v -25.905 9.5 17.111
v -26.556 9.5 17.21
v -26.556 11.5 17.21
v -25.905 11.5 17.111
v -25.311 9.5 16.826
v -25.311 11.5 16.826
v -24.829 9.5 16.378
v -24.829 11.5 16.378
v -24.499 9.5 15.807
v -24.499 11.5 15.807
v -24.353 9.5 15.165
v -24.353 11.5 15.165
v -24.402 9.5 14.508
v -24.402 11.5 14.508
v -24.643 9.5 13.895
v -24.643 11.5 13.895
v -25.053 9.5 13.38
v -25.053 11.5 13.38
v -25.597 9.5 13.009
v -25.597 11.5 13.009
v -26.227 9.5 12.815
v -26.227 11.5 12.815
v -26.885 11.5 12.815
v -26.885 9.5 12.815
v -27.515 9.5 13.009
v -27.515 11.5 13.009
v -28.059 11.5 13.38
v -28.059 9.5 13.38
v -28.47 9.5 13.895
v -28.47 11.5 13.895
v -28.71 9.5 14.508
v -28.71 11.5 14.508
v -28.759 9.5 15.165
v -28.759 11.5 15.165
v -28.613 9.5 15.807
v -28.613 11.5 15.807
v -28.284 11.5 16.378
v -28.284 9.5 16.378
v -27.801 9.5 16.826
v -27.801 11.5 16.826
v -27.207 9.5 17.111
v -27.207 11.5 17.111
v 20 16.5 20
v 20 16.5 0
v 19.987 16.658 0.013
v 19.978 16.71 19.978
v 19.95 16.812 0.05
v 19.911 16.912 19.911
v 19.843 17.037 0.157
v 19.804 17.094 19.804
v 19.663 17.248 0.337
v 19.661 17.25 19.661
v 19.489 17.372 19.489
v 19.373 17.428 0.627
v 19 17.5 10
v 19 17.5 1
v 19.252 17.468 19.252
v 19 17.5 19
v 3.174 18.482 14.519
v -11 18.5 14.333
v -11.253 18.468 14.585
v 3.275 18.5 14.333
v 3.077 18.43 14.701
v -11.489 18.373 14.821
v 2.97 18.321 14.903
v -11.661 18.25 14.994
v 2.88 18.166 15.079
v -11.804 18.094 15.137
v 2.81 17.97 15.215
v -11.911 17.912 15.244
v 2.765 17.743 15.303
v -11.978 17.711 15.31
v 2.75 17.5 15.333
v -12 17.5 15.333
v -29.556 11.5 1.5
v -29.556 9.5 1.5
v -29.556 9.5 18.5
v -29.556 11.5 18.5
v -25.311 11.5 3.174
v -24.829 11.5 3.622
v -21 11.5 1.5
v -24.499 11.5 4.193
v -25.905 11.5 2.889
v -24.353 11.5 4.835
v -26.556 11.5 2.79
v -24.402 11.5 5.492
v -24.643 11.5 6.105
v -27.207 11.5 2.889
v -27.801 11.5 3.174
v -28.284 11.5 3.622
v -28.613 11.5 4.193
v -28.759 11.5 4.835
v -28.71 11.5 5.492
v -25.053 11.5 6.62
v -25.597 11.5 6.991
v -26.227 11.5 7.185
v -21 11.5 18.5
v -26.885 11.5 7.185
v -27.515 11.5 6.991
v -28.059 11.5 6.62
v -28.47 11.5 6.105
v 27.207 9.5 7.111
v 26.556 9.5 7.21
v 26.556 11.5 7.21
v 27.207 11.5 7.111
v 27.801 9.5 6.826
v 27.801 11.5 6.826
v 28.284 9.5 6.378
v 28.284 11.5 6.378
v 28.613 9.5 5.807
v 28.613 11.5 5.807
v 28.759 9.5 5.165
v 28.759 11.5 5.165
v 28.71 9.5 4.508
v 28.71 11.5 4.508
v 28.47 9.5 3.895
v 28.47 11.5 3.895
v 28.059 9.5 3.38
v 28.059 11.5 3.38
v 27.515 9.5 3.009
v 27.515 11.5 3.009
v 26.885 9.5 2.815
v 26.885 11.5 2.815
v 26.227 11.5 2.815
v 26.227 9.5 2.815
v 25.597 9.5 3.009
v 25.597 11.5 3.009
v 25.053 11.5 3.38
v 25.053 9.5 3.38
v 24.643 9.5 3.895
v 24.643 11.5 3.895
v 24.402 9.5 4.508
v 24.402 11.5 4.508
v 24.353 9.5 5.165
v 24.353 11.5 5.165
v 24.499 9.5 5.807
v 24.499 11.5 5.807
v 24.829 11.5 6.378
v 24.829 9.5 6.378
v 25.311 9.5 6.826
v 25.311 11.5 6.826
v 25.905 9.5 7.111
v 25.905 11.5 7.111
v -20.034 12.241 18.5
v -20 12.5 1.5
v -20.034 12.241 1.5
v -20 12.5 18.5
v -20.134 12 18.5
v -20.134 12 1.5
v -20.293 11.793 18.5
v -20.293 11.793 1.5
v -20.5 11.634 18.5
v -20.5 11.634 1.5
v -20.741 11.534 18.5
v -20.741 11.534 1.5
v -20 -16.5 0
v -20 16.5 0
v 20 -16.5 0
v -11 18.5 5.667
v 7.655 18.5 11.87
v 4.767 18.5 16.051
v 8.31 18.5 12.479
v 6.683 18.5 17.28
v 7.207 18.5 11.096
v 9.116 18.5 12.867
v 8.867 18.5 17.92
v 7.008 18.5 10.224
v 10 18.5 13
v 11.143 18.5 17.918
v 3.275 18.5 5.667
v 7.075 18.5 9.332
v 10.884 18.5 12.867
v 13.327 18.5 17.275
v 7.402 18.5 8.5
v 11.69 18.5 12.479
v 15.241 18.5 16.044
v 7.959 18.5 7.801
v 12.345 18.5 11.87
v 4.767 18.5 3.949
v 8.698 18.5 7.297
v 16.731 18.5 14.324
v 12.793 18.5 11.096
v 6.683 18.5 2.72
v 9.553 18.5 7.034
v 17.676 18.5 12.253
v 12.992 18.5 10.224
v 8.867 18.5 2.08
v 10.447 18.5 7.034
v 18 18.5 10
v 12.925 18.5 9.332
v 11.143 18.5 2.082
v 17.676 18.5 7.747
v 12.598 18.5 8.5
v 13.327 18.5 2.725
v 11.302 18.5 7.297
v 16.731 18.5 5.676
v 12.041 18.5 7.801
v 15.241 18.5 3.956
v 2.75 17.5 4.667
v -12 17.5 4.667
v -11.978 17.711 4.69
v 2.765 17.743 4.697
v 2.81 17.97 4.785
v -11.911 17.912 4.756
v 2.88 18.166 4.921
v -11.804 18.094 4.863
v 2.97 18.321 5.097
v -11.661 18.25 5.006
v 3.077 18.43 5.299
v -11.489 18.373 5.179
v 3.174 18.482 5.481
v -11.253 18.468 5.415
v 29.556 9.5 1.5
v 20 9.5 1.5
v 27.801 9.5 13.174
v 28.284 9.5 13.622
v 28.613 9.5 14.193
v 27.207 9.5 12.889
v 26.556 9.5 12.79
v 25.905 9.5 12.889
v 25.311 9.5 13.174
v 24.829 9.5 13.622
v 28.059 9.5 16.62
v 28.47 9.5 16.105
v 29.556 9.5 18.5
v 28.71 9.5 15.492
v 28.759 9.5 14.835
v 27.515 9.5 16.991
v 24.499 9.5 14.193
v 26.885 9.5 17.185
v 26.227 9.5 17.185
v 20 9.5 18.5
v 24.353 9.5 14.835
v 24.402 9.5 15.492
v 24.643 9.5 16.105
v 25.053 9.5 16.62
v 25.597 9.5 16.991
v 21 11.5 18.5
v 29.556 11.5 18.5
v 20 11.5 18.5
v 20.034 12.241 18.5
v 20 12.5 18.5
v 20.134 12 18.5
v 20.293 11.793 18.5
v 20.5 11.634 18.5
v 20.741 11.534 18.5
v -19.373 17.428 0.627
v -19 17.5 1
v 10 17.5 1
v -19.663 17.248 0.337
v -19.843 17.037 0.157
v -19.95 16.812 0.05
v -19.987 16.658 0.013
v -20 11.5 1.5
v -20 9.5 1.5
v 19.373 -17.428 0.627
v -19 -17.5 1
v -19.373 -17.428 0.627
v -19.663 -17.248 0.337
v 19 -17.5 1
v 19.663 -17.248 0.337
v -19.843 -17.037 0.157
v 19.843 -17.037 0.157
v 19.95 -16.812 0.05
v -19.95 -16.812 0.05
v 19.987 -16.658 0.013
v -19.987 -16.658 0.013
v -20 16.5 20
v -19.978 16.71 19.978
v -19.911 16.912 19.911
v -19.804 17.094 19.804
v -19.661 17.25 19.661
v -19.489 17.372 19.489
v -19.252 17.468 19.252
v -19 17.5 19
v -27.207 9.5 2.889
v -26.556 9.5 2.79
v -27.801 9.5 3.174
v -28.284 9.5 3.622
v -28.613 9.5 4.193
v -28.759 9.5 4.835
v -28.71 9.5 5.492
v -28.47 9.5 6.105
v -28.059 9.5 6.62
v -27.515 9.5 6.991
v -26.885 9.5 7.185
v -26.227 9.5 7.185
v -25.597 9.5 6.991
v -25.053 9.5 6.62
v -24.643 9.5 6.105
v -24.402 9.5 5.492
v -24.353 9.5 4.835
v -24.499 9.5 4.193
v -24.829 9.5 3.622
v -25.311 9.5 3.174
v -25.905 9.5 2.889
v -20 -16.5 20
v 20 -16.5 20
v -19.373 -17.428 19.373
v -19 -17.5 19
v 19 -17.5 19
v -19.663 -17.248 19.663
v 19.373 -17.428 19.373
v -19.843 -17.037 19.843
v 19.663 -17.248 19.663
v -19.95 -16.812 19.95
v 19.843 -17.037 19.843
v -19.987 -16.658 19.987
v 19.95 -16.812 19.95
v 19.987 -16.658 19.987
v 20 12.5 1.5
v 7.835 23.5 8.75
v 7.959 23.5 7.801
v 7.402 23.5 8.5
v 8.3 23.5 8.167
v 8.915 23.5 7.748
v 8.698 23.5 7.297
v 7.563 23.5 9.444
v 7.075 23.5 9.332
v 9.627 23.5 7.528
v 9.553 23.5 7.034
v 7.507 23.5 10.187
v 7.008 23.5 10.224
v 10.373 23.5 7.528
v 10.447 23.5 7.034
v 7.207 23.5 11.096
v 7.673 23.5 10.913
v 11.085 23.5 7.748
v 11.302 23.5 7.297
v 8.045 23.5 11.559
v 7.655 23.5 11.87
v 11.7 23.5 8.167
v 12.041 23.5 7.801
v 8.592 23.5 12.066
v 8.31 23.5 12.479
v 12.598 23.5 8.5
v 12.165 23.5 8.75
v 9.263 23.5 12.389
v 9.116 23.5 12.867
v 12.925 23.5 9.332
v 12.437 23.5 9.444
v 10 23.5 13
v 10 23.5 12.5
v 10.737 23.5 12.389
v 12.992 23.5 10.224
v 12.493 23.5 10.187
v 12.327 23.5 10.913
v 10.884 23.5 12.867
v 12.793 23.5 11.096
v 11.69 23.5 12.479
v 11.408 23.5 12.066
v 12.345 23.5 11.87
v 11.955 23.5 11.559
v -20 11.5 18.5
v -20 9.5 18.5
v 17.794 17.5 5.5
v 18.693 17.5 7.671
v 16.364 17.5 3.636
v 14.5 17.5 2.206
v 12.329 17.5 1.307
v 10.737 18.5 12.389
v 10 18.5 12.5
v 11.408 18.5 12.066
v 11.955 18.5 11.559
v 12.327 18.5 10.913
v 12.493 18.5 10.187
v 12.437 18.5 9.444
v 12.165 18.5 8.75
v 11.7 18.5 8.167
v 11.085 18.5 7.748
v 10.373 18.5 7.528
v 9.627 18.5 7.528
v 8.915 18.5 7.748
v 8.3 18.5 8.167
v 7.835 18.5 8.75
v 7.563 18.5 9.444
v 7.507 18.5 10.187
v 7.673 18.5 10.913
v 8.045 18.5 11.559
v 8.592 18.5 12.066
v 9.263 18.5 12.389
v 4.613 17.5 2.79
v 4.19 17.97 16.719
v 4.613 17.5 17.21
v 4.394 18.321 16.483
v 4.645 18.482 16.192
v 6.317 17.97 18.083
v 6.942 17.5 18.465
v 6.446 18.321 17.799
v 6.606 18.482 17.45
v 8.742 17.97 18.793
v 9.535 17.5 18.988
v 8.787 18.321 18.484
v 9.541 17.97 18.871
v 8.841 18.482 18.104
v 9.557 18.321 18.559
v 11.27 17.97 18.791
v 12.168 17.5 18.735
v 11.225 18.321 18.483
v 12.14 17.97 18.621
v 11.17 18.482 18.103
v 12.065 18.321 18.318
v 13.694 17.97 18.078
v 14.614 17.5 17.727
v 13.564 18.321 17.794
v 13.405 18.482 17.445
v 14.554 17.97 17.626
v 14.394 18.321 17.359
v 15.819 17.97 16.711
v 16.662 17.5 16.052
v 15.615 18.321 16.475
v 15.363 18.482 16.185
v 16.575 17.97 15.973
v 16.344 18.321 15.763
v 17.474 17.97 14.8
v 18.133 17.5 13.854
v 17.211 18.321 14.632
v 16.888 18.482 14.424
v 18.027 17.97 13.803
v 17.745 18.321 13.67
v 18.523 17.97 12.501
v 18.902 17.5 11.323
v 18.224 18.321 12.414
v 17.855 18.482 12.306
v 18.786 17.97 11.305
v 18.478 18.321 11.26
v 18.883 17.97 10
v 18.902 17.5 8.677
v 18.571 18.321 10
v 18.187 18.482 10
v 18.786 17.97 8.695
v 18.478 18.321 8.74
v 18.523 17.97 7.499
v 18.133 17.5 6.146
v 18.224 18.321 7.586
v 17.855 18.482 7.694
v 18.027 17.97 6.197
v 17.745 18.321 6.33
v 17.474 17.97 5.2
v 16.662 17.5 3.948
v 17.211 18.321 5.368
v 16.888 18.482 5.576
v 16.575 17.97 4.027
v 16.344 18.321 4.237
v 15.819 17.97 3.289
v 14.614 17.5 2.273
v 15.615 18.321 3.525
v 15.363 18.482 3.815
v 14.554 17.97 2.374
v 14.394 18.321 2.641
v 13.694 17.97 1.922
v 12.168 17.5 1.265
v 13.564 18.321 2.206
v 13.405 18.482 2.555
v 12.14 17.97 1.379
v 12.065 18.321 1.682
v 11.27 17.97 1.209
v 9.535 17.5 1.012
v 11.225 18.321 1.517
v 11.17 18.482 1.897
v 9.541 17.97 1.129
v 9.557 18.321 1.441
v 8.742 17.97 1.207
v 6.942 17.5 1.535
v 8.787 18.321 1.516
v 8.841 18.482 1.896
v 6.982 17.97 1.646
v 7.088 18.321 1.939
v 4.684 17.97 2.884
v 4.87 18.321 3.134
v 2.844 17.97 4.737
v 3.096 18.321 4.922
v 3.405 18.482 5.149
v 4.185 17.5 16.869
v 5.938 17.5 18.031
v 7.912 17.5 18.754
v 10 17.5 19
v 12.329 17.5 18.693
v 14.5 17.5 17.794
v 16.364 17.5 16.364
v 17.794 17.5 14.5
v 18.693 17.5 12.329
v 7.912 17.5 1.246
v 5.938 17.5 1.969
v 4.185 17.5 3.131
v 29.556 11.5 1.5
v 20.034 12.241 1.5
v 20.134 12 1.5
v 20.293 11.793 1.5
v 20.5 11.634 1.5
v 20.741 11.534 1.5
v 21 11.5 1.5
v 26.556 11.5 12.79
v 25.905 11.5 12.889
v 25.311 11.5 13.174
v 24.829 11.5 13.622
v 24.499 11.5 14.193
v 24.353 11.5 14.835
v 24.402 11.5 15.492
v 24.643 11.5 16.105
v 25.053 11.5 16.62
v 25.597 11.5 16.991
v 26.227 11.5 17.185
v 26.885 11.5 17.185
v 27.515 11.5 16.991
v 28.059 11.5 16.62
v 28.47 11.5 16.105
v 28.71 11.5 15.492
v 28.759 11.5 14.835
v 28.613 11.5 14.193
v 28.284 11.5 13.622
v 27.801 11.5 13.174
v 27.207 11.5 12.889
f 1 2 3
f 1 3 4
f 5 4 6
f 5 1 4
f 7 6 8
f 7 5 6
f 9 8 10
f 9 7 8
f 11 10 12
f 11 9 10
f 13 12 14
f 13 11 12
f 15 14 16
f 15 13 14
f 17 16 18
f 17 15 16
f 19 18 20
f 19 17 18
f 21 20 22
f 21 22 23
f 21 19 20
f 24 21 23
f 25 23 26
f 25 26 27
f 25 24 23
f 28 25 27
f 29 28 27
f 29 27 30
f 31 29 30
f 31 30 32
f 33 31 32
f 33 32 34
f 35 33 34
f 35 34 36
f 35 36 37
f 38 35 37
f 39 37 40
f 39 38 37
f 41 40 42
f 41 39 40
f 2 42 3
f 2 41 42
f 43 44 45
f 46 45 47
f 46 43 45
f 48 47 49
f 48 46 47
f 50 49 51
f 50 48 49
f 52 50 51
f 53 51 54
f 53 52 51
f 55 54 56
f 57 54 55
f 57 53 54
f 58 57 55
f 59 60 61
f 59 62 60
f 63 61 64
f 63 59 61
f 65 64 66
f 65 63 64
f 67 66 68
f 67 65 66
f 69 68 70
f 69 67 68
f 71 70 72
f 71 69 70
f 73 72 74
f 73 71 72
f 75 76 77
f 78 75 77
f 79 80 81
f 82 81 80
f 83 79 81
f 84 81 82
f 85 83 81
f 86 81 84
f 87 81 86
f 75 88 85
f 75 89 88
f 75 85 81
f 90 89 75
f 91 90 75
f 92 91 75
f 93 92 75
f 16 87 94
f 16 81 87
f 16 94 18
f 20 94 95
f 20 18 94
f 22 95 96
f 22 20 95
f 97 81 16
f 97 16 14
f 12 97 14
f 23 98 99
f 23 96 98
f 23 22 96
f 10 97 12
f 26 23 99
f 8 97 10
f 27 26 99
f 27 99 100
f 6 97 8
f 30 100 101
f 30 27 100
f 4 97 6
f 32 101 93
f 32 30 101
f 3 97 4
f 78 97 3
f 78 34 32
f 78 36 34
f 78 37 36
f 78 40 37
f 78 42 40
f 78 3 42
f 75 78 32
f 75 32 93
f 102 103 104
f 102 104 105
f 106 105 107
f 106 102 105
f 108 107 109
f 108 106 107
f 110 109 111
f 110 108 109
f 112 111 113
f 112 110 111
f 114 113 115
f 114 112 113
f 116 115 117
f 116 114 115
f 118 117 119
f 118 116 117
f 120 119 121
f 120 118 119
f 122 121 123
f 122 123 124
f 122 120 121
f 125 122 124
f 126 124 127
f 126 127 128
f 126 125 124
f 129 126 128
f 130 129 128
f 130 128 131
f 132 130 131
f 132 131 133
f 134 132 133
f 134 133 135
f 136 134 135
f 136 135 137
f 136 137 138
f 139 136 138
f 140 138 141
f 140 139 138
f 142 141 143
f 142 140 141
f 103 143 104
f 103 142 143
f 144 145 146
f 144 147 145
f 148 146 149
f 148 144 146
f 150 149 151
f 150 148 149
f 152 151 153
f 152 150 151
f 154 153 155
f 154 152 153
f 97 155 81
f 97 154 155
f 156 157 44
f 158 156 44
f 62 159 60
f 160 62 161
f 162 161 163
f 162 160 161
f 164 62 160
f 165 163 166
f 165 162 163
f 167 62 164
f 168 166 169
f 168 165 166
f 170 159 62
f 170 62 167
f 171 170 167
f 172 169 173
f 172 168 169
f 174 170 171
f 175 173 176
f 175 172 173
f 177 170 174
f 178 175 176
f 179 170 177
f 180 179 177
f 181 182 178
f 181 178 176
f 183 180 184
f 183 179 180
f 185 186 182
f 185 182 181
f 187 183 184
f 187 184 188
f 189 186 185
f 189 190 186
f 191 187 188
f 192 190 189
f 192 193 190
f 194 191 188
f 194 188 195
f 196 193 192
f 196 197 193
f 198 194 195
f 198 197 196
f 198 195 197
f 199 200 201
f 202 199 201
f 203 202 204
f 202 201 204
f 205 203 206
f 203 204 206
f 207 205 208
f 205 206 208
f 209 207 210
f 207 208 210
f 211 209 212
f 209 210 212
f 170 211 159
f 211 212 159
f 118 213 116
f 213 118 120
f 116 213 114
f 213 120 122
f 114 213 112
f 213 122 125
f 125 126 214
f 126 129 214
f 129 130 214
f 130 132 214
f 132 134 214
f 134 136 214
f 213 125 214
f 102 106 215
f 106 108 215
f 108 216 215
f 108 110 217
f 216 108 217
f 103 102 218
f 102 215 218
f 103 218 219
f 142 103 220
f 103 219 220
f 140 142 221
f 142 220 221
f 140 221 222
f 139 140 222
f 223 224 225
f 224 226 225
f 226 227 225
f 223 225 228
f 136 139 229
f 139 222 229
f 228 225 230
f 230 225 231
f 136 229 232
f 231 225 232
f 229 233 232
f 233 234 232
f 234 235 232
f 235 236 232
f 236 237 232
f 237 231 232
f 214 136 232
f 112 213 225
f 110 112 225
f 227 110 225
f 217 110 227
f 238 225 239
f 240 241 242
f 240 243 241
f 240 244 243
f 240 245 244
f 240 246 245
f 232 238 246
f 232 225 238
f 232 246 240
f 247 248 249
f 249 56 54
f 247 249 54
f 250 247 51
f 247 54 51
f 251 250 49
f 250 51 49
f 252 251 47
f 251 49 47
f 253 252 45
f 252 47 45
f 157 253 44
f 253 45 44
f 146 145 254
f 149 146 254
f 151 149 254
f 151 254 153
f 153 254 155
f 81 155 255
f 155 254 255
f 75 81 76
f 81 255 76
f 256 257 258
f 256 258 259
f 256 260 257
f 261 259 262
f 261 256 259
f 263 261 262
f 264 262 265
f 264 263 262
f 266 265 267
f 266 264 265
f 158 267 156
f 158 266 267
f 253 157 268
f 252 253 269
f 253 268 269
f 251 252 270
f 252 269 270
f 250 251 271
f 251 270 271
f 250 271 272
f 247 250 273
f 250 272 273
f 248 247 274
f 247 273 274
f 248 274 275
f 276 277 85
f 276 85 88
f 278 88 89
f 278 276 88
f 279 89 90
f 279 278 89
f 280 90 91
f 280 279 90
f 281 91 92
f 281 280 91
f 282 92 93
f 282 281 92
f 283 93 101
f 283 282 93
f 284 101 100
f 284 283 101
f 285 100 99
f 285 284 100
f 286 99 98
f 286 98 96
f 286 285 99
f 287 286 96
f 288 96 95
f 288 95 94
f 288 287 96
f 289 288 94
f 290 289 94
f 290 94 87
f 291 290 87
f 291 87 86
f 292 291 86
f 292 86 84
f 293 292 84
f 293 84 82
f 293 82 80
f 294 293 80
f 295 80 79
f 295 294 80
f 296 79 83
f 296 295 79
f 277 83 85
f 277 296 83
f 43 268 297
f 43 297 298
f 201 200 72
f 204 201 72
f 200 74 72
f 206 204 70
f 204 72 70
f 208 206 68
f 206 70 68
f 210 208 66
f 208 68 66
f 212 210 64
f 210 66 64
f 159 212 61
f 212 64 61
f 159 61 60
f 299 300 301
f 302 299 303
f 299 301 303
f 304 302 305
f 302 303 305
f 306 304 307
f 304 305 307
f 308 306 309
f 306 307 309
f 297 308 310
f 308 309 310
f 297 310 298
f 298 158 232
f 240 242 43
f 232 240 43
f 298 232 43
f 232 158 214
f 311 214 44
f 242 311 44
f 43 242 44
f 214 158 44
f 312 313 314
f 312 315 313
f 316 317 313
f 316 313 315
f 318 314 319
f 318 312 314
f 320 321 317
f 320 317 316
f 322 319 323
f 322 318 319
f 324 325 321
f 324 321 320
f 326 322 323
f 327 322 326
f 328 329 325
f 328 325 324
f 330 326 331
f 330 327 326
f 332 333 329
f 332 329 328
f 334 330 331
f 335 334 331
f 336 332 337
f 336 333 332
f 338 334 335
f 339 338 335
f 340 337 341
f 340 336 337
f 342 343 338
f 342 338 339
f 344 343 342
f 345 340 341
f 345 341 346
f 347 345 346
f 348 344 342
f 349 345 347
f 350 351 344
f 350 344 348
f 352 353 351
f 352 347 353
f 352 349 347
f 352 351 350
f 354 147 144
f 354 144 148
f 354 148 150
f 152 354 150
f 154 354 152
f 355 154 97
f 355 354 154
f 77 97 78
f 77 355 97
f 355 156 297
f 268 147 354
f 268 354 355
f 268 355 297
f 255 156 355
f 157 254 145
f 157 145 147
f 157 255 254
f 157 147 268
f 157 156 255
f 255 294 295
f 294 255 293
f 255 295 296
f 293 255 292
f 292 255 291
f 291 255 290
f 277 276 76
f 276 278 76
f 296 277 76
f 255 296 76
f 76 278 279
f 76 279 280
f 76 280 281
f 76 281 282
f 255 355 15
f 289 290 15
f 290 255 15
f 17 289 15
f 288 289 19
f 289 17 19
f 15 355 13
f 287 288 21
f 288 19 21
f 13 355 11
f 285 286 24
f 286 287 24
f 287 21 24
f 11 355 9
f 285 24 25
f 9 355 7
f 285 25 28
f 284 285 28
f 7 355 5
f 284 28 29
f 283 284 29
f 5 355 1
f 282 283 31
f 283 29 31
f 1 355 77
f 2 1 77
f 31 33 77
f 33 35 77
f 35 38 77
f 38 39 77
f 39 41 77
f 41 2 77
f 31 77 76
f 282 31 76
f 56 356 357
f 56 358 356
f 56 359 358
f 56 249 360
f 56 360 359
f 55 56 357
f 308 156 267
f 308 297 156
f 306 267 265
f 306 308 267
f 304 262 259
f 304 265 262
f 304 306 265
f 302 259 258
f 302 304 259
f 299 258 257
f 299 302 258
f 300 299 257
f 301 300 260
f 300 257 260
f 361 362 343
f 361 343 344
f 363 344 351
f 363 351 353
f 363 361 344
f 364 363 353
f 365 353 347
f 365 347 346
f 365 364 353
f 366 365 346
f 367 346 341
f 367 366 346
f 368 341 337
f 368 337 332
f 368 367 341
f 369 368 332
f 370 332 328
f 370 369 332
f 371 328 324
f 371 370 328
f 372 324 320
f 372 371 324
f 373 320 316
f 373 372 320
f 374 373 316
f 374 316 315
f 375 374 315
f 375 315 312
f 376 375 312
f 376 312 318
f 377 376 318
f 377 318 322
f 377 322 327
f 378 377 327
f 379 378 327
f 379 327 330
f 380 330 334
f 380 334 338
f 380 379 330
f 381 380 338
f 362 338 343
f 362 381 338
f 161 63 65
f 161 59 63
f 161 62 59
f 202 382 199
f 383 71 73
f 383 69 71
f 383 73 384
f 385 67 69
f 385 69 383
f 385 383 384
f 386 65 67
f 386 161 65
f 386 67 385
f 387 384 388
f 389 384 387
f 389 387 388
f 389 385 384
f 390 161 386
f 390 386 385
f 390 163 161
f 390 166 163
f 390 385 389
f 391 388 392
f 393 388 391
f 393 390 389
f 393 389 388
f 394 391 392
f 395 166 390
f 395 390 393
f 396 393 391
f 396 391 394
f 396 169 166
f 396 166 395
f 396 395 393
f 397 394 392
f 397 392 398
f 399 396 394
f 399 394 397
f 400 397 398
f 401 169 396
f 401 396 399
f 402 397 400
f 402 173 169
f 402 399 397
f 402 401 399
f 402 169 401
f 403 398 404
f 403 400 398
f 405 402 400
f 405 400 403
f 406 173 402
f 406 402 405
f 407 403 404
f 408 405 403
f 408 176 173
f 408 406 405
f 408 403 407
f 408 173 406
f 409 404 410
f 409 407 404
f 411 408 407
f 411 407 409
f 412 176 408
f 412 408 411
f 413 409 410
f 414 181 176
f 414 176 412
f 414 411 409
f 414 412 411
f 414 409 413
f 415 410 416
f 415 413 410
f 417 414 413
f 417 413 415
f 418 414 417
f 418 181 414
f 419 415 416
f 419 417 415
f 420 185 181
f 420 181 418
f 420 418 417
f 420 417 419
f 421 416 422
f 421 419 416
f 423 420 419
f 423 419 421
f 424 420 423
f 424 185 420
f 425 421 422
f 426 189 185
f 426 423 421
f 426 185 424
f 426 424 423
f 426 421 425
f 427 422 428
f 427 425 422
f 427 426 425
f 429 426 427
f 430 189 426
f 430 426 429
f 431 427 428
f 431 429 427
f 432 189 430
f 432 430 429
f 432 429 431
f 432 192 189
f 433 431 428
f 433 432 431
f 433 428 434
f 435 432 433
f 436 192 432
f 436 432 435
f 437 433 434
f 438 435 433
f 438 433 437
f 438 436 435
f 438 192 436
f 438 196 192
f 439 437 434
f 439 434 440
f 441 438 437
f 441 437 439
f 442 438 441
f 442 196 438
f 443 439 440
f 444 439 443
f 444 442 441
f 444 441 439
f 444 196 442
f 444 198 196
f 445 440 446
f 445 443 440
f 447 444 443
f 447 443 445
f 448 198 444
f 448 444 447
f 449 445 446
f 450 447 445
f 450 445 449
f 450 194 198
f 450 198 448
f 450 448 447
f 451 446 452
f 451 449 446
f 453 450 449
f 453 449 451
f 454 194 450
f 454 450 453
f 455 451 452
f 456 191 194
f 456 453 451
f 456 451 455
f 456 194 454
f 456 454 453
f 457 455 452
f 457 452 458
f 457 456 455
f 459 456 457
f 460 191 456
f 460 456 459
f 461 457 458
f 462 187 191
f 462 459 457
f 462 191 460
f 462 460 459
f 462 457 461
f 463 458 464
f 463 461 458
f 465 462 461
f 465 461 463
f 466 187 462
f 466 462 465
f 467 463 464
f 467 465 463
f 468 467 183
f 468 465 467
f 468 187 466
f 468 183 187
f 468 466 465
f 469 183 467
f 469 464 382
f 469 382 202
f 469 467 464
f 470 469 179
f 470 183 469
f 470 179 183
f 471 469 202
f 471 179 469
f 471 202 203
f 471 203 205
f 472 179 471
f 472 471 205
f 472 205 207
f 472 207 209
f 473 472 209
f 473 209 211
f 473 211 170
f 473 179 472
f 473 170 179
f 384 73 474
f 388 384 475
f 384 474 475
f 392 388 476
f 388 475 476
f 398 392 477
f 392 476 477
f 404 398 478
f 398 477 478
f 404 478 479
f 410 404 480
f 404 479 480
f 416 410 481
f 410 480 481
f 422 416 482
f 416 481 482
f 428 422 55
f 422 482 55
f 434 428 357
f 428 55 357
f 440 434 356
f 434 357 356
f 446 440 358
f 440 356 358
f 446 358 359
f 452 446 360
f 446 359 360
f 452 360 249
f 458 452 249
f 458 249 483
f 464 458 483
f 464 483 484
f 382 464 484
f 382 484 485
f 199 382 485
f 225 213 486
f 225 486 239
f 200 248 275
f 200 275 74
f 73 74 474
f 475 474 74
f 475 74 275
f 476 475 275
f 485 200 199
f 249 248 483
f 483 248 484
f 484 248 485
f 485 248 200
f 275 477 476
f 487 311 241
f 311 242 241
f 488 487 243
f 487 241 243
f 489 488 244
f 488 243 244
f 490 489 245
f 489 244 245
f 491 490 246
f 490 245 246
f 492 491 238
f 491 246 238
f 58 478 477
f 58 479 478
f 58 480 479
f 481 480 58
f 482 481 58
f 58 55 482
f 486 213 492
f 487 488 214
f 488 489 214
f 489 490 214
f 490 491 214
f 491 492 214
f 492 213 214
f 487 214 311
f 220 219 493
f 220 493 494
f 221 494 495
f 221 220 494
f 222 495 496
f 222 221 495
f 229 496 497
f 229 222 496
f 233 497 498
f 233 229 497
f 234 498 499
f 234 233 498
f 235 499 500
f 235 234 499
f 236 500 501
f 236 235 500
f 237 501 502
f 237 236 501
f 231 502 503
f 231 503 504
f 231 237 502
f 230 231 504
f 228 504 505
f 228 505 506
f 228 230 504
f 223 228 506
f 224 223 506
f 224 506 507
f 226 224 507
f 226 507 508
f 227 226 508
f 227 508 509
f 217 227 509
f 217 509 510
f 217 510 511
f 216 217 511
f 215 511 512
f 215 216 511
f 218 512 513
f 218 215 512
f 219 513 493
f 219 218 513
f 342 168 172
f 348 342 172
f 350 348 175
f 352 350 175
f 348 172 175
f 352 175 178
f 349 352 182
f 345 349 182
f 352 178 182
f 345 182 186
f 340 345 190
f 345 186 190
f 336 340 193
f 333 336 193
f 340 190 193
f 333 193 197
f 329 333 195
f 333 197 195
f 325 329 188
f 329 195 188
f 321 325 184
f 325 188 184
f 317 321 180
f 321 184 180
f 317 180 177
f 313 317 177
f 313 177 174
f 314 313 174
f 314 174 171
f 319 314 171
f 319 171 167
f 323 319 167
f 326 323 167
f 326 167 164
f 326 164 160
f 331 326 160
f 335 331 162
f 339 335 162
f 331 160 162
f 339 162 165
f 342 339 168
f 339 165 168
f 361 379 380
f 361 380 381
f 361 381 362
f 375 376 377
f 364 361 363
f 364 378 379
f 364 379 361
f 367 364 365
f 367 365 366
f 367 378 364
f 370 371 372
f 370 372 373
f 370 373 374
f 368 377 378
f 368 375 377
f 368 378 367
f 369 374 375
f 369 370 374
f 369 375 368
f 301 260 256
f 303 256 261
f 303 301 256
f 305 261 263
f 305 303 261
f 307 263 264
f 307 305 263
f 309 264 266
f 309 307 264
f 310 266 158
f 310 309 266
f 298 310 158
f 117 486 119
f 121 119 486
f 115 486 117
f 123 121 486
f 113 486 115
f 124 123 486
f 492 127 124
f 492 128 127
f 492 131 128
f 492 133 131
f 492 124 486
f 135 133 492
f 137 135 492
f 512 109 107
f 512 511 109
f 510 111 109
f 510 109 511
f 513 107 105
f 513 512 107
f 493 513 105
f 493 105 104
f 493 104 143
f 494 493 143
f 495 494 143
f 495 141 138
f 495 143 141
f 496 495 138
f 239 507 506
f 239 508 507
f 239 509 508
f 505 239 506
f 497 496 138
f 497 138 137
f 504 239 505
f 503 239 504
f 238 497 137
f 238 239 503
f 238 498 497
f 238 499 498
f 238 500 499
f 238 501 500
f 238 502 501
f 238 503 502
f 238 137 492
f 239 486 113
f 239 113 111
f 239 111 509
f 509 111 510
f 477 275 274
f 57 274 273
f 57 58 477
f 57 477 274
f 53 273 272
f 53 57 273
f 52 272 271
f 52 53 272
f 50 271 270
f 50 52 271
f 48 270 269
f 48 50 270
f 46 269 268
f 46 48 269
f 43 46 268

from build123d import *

# Parameters (mm, degrees)
SKETCH1_W           = 40
SKETCH1_H           = 35
BOSS_EXTRUDE1_DEPTH = 20
FILLET1_R           = 1
SKETCH2_W           = 9.556150209
SKETCH2_H           = 17
SKETCH2_R           = 2.209517665
BOSS_EXTRUDE2_DEPTH = 2
BOSS_EXTRUDE3_DEPTH = 1
SKETCH4_R           = 3
SKETCH4_R_2         = 2.5
BOSS_EXTRUDE4_DEPTH = 5
FILLET2_R           = 1


with BuildPart() as part:
    # Sketch1 → Boss-Extrude1 (new body)
    with BuildSketch(Plane.XY):
        Rectangle(SKETCH1_W, SKETCH1_H)
    extrude(amount=BOSS_EXTRUDE1_DEPTH)

    # Fillet1
    fillet1_edges = [part.edges().sort_by_distance(p)[0] for p in [
        (0, -17.5, 20),
        (0, -17.5, 0),
        (0, 17.5, 0),
        (20, -17.5, 10),
        (-20, -17.5, 10),
        (-20, 17.5, 10),
        (20, 17.5, 10),
        (0, 17.5, 20),
    ]]
    fillet(fillet1_edges, radius=FILLET1_R)

    # Sketch2 → Boss-Extrude2 (add)
    # profile 1 of 2: a face of its own
    with BuildSketch(Plane(origin=(0, 9.5, 0), x_dir=(-1, 0, 0), z_dir=(0, 1, 0))):
        with Locations((24.778075105, 10)):
            Rectangle(SKETCH2_W, SKETCH2_H)
        with Locations(Location((26.556150209, 5, 0), (0, 0, 270))):
            Circle(SKETCH2_R, mode=Mode.SUBTRACT)
        with Locations(Location((26.556150209, 15, 0), (0, 0, 90))):
            Circle(SKETCH2_R, mode=Mode.SUBTRACT)
    # profile 2 of 2: a face of its own
    with BuildSketch(Plane(origin=(0, 9.5, 0), x_dir=(-1, 0, 0), z_dir=(0, 1, 0))):
        with Locations((-24.778075105, 10)):
            Rectangle(SKETCH2_W, SKETCH2_H)
        with Locations(Location((-26.556150209, 5, 0), (0, 0, 90))):
            Circle(SKETCH2_R, mode=Mode.SUBTRACT)
        with Locations(Location((-26.556150209, 15, 0), (0, 0, 270))):
            Circle(SKETCH2_R, mode=Mode.SUBTRACT)
    extrude(amount=BOSS_EXTRUDE2_DEPTH)

    # Sketch3 → Boss-Extrude3 (add)
    with BuildSketch(Plane(origin=(0, 17.5, 0), x_dir=(1, 0, 0), z_dir=(0, 1, 0))):
        with BuildLine():
            Line((2.749933149, -4.667408636), (-12, -4.667408636))
            Line((-12, -4.667408636), (-12, -15.332591364))
            Line((-12, -15.332591364), (2.749933149, -15.332591364))
            ThreePointArc((2.749933149, -15.332591364), (19, -10), (2.749933149, -4.667408636))
        make_face()
    extrude(amount=BOSS_EXTRUDE3_DEPTH)

    # Sketch4 → Boss-Extrude4 (add)
    with BuildSketch(Plane(origin=(0, 18.5, 0), x_dir=(1, 0, 0), z_dir=(0, 1, 0))):
        with Locations(Location((10, -10, 0), (0, 0, 270))):
            Circle(SKETCH4_R)
        with Locations(Location((10, -10, 0), (0, 0, 270))):
            Circle(SKETCH4_R_2, mode=Mode.SUBTRACT)
    extrude(amount=BOSS_EXTRUDE4_DEPTH)

    # Fillet2
    fillet2_edges = [part.edges().sort_by_distance(p)[0] for p in [
        (20, 11.5, 10),
        (-20, 11.5, 10),
        (-12, 18.5, 10),
        (-4.625033426, 18.5, 4.667408636),
        (19, 18.5, 10),
        (-4.625033426, 18.5, 15.332591364),
    ]]
    fillet(fillet2_edges, radius=FILLET2_R - 0.0001)  # a hair under: the kernel refuses the full size


solid = part.part
